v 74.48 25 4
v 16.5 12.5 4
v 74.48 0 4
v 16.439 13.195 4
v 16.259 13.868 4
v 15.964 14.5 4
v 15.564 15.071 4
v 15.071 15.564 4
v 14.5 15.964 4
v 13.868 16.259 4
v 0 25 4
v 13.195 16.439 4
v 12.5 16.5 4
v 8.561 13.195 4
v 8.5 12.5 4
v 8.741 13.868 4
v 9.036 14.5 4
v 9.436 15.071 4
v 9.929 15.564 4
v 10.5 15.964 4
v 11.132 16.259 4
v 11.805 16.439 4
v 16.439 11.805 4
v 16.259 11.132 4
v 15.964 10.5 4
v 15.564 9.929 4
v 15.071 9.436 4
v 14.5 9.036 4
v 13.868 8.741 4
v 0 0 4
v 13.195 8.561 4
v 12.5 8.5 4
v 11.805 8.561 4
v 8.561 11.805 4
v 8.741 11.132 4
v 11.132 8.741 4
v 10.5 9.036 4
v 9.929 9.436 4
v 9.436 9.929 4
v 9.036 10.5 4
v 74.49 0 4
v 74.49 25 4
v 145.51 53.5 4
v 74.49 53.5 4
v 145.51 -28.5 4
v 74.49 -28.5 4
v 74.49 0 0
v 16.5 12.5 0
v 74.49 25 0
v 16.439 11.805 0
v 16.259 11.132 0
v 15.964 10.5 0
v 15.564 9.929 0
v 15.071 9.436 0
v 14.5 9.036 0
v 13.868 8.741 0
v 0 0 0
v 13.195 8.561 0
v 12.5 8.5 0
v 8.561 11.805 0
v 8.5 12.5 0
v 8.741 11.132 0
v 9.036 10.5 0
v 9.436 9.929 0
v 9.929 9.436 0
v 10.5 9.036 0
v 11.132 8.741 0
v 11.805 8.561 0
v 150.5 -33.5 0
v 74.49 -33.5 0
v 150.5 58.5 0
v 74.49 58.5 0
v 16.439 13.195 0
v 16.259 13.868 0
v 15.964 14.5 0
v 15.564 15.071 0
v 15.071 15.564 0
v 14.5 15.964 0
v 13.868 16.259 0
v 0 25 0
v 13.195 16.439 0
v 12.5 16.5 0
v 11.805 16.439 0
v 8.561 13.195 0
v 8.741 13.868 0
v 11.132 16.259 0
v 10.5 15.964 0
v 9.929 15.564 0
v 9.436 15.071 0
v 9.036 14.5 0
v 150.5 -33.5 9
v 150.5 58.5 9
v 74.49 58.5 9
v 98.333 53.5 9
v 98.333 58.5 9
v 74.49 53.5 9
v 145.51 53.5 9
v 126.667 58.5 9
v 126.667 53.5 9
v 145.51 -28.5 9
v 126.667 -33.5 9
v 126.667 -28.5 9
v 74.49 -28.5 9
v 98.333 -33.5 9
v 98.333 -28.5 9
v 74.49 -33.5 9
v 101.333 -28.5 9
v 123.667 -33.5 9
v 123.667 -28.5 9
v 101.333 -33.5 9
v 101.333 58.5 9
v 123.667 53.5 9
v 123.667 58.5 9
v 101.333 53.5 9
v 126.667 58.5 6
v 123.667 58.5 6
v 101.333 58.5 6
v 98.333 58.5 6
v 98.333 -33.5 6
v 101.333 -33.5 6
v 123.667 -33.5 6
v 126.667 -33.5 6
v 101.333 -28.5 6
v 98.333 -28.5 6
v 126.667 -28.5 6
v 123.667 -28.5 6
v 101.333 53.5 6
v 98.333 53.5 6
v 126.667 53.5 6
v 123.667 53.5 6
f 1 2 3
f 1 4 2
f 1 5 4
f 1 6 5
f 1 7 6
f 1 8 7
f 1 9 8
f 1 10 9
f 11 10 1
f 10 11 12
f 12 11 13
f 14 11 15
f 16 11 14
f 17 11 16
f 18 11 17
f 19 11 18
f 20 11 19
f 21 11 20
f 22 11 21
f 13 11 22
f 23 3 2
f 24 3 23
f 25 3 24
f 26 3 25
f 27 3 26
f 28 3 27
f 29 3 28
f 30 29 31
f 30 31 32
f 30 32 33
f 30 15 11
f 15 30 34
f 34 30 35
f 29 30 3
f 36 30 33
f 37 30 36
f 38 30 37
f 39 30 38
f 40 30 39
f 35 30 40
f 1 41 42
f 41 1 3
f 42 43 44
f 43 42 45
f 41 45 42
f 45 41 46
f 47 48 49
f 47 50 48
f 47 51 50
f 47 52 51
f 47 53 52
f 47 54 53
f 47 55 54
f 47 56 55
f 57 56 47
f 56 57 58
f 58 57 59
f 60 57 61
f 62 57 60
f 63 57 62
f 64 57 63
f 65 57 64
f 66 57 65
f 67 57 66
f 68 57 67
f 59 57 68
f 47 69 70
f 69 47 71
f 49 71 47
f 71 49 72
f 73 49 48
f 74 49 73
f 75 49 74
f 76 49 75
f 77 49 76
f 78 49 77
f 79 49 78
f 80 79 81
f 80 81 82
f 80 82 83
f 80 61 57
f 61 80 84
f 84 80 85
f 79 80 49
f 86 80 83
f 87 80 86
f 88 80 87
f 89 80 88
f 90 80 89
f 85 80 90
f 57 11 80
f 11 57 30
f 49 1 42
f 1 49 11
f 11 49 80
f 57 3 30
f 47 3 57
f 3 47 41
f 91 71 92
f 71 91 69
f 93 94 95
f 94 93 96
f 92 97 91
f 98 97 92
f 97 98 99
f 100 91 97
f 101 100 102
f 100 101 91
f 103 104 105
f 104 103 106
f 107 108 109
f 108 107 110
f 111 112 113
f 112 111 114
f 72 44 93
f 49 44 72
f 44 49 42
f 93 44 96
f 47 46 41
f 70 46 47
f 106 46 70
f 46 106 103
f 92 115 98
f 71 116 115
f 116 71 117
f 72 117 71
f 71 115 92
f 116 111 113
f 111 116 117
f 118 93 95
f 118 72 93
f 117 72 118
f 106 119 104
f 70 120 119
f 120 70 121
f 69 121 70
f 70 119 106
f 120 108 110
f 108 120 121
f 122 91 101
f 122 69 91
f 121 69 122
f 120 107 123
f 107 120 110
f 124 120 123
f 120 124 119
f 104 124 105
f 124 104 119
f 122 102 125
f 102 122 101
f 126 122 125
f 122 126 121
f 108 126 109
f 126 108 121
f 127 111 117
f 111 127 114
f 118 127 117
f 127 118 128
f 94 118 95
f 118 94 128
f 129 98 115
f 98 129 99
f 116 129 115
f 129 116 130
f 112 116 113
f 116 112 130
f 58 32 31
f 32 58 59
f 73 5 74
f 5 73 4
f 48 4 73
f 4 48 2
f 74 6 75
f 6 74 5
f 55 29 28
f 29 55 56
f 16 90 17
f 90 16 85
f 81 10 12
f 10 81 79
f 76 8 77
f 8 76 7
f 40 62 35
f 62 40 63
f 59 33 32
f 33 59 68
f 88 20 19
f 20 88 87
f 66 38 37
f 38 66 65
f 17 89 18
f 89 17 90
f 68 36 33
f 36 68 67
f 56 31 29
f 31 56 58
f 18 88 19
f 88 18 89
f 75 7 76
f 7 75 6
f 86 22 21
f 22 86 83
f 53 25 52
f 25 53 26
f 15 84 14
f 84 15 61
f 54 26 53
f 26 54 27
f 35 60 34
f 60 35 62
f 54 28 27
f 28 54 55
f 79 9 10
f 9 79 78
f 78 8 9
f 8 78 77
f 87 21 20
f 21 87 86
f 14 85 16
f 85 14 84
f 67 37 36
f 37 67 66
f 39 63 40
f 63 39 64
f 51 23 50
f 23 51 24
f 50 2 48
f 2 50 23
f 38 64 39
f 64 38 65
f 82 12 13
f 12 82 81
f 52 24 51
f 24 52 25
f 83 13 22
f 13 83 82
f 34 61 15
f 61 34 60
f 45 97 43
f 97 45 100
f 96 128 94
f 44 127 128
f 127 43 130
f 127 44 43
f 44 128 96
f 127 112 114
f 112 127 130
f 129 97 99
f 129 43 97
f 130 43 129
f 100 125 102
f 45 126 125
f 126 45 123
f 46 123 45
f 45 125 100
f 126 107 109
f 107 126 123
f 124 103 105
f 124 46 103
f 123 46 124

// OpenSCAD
// ============================================================
// Digi-Shaker: Servo Arm + Digivice Cradle
// ============================================================
// Parametric 3D model for MG996R servo arm with integrated
// cradle for Digivice D3 V3 Japan Edition.
//
// The Digivice lies FLAT in the cradle, rotated so its long
// axis (top-to-bottom) runs ACROSS the arm. This way, the
// up-and-down servo swing applies force along the device's
// length, matching how a pedometer detects steps.
//
// Usage:
//   1. Adjust parameters below to fit your device
//   2. Press F5 to preview
//   3. Press F6 to render
//   4. Export as STL (File > Export as STL)
//
// Print settings: PLA, 0.2mm layer height, 20-30% infill,
// no supports needed (prints flat on bed)
// ============================================================

// --- Digivice dimensions (mm) ---
digivice_height    = 80;   // Top-to-bottom (long axis) → becomes cradle WIDTH
digivice_width     = 64;   // Left-to-right (short axis) → becomes cradle LENGTH (along arm)

// --- Clearance ---
clearance = 1;             // Gap per side for easy fit

// --- Arm dimensions ---
arm_length    = 100;       // Servo center to cradle center
arm_width     = 25;        // Width of the arm beam
arm_thickness = 4;         // Thickness of the base plate

// --- Cradle walls ---
wall_height    = 5;        // How high walls rise above arm surface
wall_thickness = 5;        // Wall thickness

// --- Servo horn mount ---
horn_center_hole = 8.0;    // Center hole for servo center screw clearance

// --- Rubber band slots ---
band_slot_width = 3;       // Width of each U-notch
band_slot_depth = 3;       // Depth of each U-notch

// ============================================================
// Derived dimensions
// ============================================================

e = 0.01;  // Epsilon for clean boolean operations

// Cradle pocket: Digivice rotated 90° so height runs across arm (Y)
// and width runs along arm (X)
pocket_along_arm = digivice_width + 2 * clearance;   // 65mm (along X)
pocket_across_arm = digivice_height + 2 * clearance;  // 77mm (along Y)

cradle_outer_length = pocket_along_arm + 2 * wall_thickness;   // X direction
cradle_outer_width  = pocket_across_arm + 2 * wall_thickness;  // Y direction

total_height = arm_thickness + wall_height;

servo_mount_length = arm_width;
beam_length = arm_length - servo_mount_length / 2 - cradle_outer_length / 2;

// Where the cradle starts on the X axis
cradle_x = servo_mount_length + beam_length;
// Y offset to center the cradle on the arm
cradle_y = (arm_width - cradle_outer_width) / 2;

// ============================================================
// Dimension readout (printed to console on F5/F6)
// ============================================================

echo(str("=== Dimensions ==="));
echo(str("Total length (along arm): ", cradle_x + cradle_outer_length, " mm"));
echo(str("Cradle outer width (across arm): ", cradle_outer_width, " mm"));
echo(str("Cradle pocket: ", pocket_along_arm, " x ", pocket_across_arm, " mm"));
echo(str("Total height: ", total_height, " mm"));
echo(str("Arm beam length: ", beam_length, " mm"));

// ============================================================
// Single solid body with all cuts applied at once
// ============================================================

difference() {
    // --- Positive geometry ---
    union() {
        // Servo mount plate + arm beam as one continuous slab
        cube([cradle_x + e, arm_width, arm_thickness]);

        // Cradle solid block (overlaps beam by epsilon)
        translate([cradle_x - e, cradle_y, 0])
            cube([cradle_outer_length + e, cradle_outer_width, total_height]);
    }

    // --- Negative geometry (all cuts) ---

    // Center hole for servo center screw clearance
    translate([servo_mount_length/2, arm_width/2, -e])
        cylinder(h = arm_thickness + 2*e, d = horn_center_hole, $fn = 36);

    // Cradle pocket interior (open on one short side for device insertion)
    // Open on the X-min side (toward servo) so device slides in from the arm side
    translate([cradle_x - 2*e, cradle_y + wall_thickness, arm_thickness])
        cube([cradle_outer_length - wall_thickness + 3*e,
              pocket_across_arm,
              wall_height + e]);

    // --- Rubber band slots on long walls (Y-min and Y-max) ---
    // These walls run along the Digivice's height (the long axis)

    // Left long wall (Y-min side)
    for (i = [0 : 1]) {
        slot_x = cradle_x + cradle_outer_length * (i + 1) / 3 - band_slot_width / 2;
        translate([slot_x, cradle_y - e, total_height - band_slot_depth])
            cube([band_slot_width, wall_thickness + 2*e, band_slot_depth + e]);
    }

    // Right long wall (Y-max side)
    for (i = [0 : 1]) {
        slot_x = cradle_x + cradle_outer_length * (i + 1) / 3 - band_slot_width / 2;
        translate([slot_x, cradle_y + cradle_outer_width - wall_thickness - e, total_height - band_slot_depth])
            cube([band_slot_width, wall_thickness + 2*e, band_slot_depth + e]);
    }
}
